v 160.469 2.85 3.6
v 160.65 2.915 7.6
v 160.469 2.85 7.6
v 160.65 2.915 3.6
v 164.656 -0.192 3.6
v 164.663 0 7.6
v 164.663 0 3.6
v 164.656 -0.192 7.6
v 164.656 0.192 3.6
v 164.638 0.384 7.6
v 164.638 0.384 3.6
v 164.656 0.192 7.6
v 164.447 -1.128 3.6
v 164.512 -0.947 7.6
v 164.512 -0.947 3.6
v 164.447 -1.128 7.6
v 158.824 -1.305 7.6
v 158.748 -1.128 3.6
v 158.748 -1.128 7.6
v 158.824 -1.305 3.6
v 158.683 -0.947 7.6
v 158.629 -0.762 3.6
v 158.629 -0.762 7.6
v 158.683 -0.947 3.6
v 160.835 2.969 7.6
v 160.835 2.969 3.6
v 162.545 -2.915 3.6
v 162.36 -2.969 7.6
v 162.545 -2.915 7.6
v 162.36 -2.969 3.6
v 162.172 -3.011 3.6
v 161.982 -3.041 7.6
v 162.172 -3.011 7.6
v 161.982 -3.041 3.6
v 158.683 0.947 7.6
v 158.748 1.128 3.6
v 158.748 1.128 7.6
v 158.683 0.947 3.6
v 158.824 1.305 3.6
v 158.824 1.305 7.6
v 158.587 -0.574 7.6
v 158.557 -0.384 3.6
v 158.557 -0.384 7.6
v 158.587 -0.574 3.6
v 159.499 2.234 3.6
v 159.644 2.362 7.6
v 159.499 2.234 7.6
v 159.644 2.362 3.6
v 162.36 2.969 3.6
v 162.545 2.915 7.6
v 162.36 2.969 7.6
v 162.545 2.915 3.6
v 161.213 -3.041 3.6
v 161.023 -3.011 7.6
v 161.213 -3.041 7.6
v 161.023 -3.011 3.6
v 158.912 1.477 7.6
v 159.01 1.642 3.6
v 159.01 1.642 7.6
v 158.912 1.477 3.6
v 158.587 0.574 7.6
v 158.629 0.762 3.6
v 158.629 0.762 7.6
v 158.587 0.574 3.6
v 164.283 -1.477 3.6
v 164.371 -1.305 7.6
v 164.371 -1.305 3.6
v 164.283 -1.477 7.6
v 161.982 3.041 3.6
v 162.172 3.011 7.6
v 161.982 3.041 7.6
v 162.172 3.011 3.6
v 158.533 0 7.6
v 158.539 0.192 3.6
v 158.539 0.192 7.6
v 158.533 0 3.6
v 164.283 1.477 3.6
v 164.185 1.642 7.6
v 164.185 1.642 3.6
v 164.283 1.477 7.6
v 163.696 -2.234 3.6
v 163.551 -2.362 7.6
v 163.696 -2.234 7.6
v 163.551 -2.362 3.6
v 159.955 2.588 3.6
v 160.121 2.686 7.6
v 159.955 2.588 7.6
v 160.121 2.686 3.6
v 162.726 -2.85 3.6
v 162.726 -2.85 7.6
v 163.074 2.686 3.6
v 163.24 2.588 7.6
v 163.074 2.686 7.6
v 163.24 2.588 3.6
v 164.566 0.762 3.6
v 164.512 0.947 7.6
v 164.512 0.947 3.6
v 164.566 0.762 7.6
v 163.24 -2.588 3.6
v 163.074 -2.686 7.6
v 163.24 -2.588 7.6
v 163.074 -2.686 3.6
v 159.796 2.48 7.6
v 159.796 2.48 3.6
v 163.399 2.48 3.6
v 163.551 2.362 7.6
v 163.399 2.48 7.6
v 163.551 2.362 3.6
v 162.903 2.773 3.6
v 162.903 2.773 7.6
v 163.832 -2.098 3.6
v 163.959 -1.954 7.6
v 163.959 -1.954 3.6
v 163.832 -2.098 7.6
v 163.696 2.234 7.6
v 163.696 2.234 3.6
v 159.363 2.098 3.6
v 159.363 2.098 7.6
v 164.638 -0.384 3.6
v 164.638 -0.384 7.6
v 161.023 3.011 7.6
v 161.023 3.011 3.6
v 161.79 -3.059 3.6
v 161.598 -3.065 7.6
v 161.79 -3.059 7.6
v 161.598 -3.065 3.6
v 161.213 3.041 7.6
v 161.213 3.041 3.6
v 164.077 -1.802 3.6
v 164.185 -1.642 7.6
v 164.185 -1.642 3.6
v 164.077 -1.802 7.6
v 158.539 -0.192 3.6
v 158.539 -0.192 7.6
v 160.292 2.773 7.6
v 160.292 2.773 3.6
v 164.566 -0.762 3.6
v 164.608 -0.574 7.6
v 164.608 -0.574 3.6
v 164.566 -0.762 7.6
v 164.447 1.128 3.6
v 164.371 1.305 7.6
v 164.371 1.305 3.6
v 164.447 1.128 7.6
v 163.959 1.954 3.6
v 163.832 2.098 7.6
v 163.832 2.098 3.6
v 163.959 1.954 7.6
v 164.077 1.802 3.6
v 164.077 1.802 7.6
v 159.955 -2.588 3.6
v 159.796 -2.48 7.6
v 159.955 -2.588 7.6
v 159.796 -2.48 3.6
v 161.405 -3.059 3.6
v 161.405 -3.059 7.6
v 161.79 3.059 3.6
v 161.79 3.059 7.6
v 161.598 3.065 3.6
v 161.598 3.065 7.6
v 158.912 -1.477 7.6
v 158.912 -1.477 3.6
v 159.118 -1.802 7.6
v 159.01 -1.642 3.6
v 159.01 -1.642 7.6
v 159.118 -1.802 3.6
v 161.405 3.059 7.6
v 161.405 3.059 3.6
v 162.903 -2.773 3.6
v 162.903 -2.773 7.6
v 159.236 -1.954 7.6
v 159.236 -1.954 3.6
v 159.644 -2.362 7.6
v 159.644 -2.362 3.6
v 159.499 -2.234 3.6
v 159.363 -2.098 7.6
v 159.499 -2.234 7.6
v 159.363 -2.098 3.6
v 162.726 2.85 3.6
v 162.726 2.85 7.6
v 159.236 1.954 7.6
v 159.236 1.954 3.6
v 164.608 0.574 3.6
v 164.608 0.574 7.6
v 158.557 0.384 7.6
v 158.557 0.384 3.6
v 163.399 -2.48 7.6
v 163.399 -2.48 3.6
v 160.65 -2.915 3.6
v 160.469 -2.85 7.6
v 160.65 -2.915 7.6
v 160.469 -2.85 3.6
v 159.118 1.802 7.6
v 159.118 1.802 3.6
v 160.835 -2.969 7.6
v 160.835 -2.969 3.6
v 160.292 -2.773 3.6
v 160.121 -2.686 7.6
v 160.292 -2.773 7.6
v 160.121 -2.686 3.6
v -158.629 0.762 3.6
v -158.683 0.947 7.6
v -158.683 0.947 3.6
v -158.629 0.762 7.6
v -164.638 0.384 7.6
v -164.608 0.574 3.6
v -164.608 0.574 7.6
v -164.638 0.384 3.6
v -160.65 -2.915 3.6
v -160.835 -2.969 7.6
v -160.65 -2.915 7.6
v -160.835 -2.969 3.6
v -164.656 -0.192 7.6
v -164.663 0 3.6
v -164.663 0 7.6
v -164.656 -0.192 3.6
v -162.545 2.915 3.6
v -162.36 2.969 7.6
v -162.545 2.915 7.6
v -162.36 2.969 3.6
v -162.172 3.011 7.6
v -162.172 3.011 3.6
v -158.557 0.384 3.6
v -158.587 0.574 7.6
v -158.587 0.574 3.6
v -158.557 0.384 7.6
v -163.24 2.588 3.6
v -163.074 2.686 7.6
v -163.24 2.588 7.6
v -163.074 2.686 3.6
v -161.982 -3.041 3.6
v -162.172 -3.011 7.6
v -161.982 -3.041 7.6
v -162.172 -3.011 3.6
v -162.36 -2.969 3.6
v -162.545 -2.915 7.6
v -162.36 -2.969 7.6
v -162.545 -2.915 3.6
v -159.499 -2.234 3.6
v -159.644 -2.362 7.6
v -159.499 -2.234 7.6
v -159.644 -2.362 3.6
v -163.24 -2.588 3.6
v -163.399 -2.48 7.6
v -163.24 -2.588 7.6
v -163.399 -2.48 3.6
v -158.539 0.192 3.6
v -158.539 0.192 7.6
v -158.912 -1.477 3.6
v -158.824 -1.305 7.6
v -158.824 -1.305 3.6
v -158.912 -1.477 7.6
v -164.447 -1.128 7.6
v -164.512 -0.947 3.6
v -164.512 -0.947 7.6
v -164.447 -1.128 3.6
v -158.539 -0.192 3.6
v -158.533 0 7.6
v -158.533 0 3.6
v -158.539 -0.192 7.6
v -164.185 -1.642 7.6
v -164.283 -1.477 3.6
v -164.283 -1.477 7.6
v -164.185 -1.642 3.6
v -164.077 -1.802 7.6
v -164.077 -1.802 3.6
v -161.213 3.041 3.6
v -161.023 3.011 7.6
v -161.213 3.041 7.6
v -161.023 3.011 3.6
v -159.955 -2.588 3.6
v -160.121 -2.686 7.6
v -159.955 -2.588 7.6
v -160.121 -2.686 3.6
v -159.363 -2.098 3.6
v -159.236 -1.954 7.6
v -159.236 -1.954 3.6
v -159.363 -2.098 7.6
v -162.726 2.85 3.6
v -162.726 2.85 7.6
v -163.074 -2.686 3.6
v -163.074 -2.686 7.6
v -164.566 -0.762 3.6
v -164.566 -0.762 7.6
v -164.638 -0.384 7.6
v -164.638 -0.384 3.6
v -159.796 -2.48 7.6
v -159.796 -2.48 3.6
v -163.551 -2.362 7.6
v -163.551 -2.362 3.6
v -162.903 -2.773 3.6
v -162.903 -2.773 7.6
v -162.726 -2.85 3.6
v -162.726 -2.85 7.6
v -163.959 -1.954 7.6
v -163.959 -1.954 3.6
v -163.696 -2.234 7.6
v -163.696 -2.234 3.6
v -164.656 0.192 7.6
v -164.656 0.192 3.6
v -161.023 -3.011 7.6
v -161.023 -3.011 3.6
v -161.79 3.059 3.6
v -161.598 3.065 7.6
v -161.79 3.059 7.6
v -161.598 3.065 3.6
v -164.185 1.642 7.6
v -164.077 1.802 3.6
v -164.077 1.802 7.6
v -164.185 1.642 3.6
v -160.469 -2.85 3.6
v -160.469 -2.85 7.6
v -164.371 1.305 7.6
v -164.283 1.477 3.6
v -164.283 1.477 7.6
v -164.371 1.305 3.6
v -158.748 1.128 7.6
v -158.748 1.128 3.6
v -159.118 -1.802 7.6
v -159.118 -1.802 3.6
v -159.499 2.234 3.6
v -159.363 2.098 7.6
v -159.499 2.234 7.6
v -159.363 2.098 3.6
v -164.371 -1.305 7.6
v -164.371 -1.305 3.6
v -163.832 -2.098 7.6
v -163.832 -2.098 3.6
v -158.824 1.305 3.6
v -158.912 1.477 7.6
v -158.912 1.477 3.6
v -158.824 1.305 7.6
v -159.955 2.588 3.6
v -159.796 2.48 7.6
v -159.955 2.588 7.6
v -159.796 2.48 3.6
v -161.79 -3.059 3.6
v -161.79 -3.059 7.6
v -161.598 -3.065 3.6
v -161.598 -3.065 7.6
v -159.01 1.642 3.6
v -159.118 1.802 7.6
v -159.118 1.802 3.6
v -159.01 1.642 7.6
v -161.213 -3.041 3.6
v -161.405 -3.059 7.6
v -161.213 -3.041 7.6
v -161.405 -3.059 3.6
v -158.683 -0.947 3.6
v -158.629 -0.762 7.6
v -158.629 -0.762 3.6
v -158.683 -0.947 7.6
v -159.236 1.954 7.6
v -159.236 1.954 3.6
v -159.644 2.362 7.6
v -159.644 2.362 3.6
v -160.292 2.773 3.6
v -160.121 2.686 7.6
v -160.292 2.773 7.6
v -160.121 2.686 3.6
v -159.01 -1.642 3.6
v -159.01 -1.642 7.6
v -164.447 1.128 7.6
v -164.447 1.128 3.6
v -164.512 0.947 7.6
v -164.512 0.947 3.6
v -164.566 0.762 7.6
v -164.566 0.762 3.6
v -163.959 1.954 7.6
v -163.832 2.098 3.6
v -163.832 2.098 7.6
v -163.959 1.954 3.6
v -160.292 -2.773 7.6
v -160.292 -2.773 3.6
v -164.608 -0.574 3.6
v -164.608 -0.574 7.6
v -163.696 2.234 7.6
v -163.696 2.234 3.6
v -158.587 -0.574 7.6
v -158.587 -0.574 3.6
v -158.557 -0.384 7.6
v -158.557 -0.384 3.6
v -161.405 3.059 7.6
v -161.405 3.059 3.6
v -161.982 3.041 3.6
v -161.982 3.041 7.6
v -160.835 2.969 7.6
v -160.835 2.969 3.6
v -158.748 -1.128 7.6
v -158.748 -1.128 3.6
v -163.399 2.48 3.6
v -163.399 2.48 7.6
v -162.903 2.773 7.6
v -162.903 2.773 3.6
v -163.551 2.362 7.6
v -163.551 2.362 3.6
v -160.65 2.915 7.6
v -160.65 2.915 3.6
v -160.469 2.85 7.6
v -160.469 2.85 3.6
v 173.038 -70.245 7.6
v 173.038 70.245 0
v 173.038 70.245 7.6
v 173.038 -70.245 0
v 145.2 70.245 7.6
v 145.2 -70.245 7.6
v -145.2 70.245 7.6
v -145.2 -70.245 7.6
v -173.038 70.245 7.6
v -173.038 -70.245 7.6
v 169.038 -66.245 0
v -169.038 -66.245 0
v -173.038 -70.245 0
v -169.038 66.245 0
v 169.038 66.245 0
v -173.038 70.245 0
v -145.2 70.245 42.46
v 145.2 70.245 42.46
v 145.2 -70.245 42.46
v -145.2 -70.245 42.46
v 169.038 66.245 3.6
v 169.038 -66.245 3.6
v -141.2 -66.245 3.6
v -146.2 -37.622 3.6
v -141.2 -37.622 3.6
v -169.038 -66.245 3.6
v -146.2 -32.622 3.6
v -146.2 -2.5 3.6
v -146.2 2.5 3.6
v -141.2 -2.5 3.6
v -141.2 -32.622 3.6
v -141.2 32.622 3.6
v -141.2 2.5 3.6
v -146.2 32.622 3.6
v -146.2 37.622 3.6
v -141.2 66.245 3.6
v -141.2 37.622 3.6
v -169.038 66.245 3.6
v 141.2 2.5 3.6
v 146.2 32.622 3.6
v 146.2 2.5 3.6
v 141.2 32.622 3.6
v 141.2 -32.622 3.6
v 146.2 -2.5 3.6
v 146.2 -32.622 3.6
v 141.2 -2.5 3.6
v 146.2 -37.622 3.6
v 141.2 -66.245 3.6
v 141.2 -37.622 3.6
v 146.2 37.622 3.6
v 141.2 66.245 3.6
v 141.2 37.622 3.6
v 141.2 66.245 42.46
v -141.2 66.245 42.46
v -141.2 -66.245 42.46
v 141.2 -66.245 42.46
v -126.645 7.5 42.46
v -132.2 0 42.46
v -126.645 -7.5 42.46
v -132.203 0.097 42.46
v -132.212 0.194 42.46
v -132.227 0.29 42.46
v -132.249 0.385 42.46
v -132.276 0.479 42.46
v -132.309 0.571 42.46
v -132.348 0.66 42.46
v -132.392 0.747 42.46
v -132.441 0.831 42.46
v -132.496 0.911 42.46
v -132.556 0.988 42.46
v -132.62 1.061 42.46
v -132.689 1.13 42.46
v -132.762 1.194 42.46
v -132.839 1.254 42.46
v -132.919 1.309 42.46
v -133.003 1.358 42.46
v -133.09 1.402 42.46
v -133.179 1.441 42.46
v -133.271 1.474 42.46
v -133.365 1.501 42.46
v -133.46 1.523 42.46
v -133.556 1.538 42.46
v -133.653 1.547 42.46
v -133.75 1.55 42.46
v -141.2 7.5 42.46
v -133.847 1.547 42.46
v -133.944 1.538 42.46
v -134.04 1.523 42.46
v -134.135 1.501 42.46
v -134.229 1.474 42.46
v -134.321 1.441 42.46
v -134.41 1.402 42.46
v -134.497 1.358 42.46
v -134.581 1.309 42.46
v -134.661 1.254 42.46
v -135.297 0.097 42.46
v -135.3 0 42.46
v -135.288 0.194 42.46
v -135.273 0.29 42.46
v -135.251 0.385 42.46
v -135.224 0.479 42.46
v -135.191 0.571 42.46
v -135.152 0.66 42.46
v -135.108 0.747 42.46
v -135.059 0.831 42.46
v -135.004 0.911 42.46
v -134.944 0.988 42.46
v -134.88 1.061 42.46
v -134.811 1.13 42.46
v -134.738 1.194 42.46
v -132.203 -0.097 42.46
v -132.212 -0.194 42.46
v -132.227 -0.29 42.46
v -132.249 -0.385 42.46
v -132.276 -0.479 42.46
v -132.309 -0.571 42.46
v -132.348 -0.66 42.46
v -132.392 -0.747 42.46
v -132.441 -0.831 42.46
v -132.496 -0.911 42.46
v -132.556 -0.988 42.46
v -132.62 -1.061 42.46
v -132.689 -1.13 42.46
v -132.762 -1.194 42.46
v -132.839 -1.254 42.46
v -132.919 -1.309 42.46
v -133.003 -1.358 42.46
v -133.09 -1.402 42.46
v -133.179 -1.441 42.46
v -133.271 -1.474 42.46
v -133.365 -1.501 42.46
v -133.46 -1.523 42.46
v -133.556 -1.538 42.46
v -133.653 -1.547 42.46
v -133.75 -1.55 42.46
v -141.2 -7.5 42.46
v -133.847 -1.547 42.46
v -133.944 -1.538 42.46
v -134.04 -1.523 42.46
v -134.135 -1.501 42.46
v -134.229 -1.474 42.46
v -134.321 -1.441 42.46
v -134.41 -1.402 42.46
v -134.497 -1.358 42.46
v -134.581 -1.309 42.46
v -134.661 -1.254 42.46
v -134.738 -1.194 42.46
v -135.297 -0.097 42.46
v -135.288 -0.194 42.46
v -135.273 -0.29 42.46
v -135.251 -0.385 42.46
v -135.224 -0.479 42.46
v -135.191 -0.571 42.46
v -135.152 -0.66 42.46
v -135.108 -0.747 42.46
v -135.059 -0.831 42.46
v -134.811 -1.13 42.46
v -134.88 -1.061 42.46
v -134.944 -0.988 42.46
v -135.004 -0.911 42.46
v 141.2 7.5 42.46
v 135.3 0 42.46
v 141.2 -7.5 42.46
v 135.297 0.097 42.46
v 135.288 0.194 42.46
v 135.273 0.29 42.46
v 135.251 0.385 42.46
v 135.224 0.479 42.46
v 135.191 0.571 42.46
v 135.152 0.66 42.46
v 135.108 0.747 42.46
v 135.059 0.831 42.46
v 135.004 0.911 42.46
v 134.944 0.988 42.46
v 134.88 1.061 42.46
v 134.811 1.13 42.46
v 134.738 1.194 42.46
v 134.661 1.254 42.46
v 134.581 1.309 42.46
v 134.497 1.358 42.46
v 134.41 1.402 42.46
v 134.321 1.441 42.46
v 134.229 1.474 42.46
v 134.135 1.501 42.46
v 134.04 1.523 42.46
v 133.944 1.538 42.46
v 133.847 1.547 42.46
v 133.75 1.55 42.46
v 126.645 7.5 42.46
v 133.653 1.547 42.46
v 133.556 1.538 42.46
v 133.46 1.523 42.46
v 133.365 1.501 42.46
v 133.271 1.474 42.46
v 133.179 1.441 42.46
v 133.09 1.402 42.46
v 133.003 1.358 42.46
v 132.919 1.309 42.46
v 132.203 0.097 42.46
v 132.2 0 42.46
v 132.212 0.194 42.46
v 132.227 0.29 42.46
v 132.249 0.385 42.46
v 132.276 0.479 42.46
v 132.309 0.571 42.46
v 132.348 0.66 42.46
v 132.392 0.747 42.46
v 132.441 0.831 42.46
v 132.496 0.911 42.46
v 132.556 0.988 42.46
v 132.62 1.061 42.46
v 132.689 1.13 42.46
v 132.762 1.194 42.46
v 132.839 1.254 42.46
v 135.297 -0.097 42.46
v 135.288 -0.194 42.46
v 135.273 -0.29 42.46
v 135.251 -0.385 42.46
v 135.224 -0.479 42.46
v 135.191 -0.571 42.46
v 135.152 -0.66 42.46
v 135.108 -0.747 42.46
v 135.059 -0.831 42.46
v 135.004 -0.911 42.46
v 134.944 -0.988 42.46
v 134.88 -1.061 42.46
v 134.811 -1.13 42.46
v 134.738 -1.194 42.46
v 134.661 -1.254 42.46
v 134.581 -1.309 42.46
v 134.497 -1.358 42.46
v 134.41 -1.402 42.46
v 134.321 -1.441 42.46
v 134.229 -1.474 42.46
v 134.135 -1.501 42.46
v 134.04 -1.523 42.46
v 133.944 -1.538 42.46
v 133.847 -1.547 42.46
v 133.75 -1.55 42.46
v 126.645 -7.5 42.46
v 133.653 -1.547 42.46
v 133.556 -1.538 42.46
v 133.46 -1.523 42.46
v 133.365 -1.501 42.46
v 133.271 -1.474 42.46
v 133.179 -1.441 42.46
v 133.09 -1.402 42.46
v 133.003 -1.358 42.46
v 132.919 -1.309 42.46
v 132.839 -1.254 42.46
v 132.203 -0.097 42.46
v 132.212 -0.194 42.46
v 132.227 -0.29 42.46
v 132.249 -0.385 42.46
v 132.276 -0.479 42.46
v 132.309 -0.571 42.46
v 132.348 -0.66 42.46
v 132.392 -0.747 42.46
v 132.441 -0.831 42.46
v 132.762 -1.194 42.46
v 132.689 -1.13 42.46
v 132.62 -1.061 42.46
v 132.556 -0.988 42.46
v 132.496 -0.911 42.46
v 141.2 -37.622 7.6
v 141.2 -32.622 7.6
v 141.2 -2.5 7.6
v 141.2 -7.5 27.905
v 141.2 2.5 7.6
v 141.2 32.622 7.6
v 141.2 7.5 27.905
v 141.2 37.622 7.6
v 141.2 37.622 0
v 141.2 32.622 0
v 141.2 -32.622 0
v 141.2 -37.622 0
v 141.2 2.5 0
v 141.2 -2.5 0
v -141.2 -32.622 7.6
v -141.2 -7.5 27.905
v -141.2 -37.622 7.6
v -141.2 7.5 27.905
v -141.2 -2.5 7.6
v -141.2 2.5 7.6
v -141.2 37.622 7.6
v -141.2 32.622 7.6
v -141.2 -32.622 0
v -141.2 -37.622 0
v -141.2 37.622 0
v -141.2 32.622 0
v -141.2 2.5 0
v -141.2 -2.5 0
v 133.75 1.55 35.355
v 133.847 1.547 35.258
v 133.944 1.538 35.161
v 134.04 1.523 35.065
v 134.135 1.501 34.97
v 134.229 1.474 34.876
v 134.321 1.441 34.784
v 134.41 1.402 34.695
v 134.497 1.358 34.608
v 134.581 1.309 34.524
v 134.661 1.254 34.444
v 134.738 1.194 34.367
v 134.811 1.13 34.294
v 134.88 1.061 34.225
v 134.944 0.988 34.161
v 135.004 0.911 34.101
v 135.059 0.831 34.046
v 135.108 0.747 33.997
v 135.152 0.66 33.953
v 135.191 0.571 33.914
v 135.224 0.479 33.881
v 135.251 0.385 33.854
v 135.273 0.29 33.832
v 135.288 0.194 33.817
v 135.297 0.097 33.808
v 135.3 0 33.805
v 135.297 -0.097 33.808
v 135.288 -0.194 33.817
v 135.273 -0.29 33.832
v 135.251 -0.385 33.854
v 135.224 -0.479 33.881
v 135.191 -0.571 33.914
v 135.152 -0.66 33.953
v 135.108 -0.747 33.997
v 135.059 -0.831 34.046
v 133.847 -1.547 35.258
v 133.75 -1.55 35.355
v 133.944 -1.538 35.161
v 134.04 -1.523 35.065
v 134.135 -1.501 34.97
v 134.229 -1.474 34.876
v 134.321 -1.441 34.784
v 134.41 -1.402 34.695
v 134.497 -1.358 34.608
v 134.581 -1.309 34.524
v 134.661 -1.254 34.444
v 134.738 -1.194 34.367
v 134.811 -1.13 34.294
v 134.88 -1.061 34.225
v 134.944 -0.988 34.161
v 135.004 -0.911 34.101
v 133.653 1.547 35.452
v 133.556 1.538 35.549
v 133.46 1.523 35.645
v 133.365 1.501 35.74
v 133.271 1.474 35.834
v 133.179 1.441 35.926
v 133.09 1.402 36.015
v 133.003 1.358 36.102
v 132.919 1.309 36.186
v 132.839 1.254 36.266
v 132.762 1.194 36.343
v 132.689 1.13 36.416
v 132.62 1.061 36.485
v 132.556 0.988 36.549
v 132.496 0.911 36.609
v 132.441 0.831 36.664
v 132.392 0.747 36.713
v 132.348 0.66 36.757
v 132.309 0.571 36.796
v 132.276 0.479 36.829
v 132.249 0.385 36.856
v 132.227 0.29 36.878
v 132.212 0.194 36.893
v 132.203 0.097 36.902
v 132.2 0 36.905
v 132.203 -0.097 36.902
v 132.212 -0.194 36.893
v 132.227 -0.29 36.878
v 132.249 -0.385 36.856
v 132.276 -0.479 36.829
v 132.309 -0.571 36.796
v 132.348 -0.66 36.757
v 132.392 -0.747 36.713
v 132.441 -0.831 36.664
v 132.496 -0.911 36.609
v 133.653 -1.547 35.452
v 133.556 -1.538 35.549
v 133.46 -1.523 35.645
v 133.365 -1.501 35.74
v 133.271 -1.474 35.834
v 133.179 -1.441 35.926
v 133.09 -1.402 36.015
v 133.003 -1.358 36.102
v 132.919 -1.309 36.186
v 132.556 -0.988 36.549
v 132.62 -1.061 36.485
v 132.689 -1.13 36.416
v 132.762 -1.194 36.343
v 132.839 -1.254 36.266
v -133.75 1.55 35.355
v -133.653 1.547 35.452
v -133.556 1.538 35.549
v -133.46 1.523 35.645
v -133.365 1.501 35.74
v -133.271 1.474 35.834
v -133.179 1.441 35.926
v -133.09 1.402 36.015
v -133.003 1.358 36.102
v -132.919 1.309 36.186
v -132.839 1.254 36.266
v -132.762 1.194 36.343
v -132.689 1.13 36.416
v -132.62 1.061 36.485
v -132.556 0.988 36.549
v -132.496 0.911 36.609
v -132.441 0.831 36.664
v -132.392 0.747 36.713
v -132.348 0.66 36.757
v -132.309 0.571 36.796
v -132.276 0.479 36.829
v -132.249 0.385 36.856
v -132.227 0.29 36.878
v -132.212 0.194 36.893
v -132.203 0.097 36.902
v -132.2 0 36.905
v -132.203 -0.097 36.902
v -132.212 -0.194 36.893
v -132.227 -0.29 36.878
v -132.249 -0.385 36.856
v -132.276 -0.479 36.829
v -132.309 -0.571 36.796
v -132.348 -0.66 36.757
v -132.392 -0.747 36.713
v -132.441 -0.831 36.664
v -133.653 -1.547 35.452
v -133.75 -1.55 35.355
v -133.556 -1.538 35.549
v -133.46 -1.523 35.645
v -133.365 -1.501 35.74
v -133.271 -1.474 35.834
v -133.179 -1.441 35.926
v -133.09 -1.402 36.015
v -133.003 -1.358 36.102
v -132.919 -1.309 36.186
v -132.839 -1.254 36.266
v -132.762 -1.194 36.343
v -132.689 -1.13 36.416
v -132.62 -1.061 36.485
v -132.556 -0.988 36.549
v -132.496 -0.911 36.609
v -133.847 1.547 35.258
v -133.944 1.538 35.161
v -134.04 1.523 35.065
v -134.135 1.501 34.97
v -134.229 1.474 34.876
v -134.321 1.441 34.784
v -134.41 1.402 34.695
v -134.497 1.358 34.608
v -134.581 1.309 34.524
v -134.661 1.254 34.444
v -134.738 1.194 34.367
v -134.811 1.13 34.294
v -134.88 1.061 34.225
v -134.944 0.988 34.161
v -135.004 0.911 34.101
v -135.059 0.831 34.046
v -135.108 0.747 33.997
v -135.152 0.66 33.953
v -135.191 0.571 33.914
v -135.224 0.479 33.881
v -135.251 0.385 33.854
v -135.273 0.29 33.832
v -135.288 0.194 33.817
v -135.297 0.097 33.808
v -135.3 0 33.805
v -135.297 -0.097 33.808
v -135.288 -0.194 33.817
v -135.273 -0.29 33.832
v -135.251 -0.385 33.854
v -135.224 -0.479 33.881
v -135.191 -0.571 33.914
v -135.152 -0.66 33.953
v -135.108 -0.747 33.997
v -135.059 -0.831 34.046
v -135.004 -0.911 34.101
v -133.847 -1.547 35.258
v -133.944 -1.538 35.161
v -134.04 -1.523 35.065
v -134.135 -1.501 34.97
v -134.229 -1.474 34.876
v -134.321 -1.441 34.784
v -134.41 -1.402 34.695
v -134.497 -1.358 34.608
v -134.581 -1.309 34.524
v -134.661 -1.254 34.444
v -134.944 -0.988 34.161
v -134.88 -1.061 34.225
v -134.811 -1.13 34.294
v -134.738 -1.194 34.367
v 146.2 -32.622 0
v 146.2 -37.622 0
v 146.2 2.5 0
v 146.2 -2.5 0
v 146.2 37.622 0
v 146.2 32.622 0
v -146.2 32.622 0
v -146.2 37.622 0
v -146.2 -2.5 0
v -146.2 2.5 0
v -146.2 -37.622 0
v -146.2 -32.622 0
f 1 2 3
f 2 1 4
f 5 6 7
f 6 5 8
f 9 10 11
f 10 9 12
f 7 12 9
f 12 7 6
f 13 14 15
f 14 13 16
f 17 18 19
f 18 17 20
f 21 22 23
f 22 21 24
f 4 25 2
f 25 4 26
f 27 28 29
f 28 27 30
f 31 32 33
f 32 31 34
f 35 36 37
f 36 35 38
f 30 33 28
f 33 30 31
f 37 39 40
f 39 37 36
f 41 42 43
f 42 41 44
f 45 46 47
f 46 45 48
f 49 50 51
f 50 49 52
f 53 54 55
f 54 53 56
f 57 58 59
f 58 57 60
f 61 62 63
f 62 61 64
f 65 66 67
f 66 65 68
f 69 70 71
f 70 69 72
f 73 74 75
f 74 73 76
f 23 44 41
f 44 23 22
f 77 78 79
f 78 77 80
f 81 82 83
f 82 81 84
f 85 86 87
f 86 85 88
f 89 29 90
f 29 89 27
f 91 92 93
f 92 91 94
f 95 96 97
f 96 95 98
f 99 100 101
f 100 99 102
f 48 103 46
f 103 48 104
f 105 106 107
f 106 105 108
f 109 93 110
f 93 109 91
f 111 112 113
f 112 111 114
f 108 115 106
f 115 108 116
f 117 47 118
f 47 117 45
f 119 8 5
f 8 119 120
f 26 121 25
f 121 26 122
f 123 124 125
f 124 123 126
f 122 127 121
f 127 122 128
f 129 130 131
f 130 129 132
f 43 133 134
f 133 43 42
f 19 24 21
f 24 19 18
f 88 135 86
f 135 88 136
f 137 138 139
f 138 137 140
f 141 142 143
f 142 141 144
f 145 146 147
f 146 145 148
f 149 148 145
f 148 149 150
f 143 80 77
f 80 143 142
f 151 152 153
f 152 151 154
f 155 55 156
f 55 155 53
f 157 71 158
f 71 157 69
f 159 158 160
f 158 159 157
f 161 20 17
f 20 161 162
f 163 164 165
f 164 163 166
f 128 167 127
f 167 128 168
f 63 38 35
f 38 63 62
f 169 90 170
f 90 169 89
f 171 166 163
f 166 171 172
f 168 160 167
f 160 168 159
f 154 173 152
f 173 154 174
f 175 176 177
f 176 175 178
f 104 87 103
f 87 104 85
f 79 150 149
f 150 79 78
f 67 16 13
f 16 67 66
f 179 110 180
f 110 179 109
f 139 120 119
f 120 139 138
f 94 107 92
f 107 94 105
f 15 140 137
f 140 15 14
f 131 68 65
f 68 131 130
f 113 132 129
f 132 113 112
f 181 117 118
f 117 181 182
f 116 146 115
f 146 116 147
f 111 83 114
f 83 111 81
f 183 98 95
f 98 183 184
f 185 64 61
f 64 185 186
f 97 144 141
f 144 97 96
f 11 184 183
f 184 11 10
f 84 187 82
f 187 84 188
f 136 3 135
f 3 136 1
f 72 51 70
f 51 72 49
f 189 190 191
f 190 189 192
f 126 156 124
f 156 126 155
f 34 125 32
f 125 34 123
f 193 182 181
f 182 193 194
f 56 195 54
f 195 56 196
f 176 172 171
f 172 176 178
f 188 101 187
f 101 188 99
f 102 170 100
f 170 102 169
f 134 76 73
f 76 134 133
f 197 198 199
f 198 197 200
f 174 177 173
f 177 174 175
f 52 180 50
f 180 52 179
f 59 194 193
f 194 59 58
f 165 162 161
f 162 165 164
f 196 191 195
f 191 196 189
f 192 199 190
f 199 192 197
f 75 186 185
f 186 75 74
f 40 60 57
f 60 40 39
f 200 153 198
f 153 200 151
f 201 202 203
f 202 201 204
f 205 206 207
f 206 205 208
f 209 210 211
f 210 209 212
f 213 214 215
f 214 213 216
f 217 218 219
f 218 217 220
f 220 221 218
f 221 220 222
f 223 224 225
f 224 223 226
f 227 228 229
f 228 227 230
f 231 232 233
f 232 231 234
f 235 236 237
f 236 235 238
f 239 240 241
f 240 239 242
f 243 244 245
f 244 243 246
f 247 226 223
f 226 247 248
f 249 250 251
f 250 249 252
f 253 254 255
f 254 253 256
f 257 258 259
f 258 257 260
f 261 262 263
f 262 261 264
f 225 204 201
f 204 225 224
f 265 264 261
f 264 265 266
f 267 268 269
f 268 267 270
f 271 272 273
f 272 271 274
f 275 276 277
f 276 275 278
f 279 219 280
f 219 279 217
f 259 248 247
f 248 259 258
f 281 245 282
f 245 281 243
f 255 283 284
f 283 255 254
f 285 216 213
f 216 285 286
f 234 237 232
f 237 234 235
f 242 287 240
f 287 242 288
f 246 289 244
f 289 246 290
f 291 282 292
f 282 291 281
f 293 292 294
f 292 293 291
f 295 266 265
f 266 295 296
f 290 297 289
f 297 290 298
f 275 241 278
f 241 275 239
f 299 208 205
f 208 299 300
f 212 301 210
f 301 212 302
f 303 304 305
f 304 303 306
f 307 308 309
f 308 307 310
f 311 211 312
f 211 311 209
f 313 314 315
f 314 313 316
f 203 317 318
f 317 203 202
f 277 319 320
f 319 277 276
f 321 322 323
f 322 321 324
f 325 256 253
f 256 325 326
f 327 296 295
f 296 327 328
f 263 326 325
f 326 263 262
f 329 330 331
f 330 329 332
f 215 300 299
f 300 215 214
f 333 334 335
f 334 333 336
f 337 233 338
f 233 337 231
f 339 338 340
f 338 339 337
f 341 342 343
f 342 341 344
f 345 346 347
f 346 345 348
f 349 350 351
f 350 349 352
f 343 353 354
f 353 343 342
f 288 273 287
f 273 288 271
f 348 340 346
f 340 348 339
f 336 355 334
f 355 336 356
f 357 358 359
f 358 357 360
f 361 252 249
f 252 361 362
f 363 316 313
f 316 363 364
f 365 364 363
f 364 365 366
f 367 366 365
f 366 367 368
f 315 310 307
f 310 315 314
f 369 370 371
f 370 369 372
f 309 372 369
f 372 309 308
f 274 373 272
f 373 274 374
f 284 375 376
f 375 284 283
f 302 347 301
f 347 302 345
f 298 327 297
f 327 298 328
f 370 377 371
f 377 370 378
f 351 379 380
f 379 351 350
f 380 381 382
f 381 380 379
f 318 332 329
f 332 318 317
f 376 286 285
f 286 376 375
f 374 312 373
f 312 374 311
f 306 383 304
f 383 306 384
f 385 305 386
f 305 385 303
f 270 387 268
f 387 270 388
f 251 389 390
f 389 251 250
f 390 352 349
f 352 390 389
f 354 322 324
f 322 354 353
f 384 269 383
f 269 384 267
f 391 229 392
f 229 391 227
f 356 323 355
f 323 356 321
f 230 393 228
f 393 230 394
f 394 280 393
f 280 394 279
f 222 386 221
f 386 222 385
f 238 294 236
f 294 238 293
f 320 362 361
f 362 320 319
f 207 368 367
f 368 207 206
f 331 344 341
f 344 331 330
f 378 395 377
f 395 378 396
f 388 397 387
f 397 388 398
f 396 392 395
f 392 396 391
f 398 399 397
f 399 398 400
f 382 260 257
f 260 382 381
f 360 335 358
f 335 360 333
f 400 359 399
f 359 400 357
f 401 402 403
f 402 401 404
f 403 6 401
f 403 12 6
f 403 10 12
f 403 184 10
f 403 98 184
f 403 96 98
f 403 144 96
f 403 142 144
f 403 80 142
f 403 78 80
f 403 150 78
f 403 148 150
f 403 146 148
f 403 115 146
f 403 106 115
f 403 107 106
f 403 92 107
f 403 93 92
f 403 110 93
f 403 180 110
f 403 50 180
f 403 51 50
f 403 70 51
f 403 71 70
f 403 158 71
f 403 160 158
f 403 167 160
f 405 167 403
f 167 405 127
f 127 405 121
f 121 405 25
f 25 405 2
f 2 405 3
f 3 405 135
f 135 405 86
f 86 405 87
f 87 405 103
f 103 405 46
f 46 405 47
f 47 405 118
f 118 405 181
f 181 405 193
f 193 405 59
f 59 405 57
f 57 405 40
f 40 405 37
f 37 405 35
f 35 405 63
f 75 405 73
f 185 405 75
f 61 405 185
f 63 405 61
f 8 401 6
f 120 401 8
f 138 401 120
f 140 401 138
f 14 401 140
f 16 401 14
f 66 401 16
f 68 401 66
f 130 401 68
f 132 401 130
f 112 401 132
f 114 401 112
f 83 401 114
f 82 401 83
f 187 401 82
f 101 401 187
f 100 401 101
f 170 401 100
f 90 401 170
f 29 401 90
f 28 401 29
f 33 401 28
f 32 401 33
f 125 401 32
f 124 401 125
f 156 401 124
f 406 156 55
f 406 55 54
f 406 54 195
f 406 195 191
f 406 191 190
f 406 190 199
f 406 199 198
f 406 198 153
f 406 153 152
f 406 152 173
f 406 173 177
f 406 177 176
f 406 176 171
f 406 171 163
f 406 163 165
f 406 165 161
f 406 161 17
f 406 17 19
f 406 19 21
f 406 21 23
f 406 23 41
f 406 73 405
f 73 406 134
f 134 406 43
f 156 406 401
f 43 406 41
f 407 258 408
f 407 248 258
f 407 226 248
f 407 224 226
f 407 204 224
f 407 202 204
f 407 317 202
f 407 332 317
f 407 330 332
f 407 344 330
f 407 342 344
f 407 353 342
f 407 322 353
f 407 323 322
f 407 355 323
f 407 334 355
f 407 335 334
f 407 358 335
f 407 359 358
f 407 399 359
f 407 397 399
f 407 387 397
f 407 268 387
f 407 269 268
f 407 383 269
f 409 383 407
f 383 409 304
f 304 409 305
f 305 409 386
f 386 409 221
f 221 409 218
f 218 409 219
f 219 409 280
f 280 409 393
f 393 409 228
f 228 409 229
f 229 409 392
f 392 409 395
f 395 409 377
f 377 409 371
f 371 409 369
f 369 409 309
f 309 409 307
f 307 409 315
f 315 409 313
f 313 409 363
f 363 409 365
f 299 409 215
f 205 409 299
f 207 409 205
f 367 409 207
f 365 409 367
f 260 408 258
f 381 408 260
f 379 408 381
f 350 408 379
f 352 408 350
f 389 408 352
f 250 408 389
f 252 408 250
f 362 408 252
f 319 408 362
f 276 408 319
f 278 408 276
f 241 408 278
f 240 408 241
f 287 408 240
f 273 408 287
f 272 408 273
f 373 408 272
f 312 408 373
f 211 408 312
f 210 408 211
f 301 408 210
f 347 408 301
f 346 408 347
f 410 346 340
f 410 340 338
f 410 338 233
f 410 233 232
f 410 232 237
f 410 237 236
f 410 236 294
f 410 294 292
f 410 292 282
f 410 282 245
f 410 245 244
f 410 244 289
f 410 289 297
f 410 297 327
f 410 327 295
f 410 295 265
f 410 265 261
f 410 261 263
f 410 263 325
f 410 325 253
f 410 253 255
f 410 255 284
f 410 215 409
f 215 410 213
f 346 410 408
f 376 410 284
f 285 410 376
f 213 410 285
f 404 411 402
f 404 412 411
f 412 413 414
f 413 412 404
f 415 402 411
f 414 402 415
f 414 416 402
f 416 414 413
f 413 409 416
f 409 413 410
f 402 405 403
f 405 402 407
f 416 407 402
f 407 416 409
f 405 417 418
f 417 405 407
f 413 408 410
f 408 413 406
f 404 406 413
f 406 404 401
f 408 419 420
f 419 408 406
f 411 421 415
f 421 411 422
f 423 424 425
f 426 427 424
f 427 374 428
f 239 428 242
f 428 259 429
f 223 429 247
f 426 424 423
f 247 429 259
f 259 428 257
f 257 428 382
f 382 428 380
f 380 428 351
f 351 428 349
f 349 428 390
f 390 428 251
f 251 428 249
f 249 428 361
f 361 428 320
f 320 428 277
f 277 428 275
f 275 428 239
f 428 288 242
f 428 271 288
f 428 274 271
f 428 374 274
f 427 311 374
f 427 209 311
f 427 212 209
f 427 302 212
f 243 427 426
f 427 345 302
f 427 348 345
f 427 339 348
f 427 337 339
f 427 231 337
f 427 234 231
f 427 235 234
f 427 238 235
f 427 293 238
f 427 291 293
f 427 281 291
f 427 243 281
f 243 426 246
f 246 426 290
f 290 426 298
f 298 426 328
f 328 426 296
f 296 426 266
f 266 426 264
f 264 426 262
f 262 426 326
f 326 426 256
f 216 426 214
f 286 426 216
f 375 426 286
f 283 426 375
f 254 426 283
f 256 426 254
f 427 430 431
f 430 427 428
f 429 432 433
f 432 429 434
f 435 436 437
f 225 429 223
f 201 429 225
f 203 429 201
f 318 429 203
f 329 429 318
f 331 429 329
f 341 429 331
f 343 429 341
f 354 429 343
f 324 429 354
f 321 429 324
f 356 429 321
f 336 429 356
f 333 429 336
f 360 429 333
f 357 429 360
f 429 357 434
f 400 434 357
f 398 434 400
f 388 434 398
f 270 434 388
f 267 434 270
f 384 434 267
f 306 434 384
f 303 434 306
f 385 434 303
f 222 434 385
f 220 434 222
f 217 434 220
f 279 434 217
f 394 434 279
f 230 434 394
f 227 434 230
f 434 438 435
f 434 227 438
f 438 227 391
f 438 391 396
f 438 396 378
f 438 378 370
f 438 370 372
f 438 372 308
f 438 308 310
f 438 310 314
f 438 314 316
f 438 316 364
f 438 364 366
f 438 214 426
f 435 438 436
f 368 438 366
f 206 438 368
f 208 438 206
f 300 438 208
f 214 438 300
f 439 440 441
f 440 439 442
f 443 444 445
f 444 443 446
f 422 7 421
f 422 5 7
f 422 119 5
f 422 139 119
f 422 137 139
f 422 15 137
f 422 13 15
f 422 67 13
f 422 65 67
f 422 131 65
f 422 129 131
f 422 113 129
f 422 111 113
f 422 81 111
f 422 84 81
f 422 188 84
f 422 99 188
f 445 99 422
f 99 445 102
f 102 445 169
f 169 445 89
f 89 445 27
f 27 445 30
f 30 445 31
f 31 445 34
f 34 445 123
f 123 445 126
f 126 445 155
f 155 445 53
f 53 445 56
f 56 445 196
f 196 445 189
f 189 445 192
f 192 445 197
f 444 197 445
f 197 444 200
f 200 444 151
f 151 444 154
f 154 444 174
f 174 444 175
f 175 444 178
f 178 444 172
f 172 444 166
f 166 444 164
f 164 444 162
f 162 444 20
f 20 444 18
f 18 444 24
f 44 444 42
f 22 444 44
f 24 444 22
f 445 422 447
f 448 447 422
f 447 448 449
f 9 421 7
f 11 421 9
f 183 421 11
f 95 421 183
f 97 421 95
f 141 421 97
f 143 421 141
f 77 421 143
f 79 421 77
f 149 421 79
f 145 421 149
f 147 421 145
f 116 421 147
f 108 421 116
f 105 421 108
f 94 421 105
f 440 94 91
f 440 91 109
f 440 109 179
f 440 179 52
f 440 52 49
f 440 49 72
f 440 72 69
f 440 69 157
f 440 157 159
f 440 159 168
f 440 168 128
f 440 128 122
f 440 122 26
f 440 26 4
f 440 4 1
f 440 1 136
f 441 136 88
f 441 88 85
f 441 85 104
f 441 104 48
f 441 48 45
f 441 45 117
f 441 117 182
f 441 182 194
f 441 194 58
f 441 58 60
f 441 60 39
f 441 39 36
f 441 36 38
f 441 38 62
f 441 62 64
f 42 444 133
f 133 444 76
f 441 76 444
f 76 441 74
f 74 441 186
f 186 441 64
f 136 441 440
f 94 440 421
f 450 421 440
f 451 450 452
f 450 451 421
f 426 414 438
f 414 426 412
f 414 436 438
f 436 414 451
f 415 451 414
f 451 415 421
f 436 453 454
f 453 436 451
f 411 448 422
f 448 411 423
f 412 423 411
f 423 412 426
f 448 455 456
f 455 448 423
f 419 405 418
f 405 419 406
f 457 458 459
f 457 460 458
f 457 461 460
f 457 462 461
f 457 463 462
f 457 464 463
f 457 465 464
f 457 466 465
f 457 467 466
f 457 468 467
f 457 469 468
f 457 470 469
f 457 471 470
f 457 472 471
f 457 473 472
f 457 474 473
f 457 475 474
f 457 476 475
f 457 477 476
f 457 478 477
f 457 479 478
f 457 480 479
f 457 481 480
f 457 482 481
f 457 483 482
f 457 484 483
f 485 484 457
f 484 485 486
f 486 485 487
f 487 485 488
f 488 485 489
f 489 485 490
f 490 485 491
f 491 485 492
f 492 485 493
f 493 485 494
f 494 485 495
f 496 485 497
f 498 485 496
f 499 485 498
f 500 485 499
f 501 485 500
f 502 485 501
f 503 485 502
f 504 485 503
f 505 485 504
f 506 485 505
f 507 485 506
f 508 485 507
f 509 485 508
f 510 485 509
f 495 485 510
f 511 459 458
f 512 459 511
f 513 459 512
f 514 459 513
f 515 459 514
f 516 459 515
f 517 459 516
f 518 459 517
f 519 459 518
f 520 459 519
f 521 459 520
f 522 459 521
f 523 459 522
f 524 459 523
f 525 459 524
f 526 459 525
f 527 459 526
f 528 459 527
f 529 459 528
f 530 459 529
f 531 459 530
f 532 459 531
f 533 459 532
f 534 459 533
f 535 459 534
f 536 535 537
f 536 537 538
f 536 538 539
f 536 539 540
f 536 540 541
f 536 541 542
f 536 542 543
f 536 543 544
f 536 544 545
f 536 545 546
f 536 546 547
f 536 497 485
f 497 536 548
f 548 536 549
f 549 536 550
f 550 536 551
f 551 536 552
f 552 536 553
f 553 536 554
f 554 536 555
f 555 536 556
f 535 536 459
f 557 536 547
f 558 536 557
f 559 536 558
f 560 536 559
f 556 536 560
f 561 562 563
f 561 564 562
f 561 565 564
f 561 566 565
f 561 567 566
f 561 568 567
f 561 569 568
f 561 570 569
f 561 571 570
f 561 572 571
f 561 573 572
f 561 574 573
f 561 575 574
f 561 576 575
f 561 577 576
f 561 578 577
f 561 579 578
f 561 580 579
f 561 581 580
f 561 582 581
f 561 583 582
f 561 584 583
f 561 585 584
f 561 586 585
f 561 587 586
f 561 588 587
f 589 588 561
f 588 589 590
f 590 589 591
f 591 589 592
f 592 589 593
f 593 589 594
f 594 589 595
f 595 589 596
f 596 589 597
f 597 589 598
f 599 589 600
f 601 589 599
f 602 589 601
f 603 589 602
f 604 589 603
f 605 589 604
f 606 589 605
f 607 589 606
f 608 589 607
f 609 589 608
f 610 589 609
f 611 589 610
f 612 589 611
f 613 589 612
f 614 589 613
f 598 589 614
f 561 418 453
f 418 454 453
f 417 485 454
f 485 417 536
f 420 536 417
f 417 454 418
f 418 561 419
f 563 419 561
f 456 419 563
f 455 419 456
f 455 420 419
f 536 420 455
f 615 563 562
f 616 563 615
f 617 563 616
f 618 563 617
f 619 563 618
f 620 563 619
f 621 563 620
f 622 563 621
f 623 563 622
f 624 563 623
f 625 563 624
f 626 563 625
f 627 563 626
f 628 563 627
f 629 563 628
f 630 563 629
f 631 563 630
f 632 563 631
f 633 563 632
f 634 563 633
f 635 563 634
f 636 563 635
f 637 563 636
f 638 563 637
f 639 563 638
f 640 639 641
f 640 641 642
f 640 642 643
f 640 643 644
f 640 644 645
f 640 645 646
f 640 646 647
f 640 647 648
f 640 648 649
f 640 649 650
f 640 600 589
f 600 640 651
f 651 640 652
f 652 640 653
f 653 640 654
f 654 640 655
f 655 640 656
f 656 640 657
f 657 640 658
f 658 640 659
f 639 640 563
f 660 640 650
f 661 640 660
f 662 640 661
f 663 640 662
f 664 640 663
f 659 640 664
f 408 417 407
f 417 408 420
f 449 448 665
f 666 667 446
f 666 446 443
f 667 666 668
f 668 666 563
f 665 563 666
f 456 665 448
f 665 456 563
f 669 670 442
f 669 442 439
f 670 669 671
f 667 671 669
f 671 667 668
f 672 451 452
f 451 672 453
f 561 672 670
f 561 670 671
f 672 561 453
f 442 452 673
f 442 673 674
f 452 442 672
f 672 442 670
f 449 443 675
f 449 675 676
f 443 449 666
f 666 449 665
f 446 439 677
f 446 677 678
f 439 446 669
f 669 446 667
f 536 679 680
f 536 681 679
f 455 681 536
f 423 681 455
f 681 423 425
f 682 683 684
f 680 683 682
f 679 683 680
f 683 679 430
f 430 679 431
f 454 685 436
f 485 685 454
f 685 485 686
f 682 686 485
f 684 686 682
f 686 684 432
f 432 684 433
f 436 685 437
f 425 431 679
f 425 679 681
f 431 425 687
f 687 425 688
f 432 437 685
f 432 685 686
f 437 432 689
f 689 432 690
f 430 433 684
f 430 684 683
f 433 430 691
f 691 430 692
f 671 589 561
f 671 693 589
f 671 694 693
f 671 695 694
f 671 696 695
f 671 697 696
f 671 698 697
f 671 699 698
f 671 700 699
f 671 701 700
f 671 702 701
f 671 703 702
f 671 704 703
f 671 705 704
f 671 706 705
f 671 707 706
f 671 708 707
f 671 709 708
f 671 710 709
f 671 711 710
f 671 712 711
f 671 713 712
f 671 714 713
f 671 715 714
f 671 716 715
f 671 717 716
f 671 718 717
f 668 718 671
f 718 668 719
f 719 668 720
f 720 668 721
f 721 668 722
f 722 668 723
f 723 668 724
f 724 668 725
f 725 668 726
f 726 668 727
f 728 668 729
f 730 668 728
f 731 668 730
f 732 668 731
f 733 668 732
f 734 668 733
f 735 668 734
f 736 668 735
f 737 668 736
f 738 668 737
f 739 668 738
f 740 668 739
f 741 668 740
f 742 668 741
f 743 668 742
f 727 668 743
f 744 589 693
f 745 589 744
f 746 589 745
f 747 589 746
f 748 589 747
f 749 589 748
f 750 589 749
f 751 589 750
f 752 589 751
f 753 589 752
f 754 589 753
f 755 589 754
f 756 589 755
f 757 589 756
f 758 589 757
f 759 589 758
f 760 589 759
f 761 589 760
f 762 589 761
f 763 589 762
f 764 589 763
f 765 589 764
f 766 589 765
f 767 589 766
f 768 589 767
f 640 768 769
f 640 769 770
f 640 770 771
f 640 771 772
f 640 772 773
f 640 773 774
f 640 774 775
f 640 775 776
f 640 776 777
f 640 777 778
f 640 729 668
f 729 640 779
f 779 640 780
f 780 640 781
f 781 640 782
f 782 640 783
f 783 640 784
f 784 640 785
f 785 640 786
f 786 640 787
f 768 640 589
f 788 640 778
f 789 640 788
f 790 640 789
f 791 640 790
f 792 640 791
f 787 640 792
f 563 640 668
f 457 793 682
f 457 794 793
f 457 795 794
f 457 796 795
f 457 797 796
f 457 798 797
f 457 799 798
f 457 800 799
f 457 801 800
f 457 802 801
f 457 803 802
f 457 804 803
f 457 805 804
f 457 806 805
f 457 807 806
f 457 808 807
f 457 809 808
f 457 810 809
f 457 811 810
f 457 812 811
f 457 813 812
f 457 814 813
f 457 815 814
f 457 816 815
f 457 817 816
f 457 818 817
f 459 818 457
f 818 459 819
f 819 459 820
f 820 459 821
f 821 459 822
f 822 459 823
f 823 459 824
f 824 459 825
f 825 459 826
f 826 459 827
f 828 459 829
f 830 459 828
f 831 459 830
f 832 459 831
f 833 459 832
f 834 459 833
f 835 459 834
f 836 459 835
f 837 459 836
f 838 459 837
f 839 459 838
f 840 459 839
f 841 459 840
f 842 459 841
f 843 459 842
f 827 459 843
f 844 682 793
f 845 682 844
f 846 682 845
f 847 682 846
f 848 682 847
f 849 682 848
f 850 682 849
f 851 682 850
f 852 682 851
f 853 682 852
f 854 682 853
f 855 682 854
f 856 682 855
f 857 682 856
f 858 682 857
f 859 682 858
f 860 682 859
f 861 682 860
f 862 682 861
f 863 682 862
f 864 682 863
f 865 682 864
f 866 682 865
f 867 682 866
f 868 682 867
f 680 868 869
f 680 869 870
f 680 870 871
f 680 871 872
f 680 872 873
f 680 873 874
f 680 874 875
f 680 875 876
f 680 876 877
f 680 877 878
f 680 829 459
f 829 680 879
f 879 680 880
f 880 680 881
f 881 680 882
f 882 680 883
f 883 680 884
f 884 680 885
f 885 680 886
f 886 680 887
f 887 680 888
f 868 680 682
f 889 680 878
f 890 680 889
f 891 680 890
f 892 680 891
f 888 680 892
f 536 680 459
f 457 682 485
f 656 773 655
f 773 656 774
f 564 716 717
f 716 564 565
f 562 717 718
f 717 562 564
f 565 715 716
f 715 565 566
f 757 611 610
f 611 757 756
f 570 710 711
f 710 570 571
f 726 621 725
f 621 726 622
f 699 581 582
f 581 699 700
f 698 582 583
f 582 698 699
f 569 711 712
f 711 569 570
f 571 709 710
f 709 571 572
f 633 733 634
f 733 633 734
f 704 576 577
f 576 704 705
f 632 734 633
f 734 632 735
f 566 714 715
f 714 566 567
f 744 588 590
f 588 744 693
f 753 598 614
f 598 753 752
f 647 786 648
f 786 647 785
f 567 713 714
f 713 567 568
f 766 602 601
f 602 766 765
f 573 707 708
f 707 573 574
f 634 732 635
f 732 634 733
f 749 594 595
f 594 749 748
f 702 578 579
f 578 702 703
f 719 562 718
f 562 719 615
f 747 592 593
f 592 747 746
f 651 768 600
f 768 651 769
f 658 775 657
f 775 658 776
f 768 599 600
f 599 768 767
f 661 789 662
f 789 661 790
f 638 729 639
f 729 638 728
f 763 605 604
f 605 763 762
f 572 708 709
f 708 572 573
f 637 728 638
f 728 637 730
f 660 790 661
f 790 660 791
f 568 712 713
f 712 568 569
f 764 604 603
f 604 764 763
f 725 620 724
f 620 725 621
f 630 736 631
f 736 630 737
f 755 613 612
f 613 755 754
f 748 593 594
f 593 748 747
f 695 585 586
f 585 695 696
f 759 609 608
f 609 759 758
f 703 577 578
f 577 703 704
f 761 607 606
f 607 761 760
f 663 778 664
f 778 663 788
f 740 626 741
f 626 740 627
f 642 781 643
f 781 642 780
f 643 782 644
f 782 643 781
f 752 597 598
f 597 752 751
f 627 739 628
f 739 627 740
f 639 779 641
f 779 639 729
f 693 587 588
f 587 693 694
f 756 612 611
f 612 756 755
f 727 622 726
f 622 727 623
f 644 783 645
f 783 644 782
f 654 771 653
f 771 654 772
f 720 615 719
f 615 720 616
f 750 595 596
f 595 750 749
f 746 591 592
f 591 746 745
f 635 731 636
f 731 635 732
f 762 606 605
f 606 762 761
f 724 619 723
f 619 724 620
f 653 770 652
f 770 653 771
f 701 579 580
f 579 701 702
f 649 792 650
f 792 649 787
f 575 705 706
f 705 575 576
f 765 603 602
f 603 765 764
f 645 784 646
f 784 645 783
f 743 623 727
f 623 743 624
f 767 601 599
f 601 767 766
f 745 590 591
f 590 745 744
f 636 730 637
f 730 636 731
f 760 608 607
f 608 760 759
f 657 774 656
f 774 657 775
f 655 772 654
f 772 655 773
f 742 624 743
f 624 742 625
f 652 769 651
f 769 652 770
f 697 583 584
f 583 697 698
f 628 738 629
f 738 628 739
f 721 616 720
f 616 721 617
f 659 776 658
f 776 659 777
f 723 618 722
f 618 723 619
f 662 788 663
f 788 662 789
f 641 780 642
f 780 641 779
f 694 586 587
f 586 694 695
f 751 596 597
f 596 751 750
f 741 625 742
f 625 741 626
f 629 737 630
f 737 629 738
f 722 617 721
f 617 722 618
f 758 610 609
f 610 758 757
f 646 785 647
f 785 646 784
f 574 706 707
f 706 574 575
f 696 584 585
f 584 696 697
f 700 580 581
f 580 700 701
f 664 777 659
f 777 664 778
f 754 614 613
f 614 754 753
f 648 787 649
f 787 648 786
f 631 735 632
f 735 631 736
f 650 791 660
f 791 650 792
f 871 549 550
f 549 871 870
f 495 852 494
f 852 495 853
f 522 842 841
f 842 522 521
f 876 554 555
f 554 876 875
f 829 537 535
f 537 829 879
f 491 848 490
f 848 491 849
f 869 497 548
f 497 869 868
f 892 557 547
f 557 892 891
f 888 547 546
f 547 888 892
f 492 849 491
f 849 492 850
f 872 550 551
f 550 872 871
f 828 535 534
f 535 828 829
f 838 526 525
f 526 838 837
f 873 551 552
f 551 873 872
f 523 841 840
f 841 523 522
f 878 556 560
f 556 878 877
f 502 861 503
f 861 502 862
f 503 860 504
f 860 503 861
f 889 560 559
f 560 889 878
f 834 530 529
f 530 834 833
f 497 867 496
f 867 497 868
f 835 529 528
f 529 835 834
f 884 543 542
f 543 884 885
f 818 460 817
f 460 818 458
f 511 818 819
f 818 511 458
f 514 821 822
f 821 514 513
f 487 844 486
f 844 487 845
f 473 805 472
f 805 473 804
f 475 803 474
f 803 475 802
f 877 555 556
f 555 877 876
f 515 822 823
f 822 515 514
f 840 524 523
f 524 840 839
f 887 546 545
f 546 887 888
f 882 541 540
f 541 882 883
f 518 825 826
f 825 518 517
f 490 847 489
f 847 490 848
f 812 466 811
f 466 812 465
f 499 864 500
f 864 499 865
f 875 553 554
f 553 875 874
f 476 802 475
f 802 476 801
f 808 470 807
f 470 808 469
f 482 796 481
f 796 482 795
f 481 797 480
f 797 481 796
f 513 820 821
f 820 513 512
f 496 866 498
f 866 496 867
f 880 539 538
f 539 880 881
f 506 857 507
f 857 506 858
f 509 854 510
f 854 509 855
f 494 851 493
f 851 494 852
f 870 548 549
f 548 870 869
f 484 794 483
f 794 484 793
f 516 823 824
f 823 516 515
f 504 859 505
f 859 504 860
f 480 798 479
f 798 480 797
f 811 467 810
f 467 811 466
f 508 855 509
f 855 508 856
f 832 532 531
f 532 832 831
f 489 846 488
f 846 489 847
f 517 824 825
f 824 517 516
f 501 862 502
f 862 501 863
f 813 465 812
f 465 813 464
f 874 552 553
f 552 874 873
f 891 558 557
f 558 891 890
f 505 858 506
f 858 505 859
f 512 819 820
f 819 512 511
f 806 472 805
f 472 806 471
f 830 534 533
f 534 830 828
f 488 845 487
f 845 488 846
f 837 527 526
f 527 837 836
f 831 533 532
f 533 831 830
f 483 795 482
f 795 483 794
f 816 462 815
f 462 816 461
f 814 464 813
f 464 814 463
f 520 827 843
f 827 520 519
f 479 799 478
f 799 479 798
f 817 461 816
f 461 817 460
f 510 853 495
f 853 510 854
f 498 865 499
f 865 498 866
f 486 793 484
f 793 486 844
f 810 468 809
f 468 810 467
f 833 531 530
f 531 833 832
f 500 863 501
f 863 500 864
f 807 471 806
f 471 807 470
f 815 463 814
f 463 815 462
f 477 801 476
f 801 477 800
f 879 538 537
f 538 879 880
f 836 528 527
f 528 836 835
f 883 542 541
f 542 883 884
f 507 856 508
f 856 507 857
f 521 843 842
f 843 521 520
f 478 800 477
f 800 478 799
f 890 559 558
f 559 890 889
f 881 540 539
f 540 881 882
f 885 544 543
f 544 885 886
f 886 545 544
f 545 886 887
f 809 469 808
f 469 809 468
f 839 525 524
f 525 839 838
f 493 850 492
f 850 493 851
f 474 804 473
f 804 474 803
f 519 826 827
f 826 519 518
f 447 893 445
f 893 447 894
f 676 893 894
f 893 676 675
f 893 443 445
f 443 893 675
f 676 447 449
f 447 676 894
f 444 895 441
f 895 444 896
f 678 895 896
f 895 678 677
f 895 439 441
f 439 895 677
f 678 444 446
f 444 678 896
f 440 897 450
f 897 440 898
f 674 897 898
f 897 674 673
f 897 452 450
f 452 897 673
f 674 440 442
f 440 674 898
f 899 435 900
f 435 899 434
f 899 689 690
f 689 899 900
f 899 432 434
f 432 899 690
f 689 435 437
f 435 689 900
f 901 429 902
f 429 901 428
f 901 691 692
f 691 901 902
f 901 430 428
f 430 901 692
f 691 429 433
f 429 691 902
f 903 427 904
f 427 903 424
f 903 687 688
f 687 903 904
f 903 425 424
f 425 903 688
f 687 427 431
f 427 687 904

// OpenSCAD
// fan

box_depth = 42.46;
box_width = 99.33;
box_length = 139.92 + 106.26;
bevel = 20.58; // short way
bevel_length = 22.11; // long way
top_depth = 6.40;
hole_from_edge = 11.45;
hole_diameter = 3.1; //4.13;

// plate

width = 134;
depth = 7.6;
length = (13+5/8) * 25.4;
plate_hole_from_edge = 11.44;
plate_hole_diameter = 6.13;

plate_thickness = 4;

$fn = 100;

part_width = max(box_width + bevel*2, width);

   module prism(l, w, h){
     translate([-l/2, -w/2, -h/2])
       polyhedron(
               points=[[0,0,0], [l,0,0], [l,w,0], [0,w,0], [0,w,h], [l,w,h]],
               faces=[[0,1,2,3],[5,4,3,2],[0,4,5,1],[0,3,4],[5,2,1]]
               );
              }

module fan_body() {
  translate([0, 0, box_depth/2])
  cube([box_length, box_width, box_depth],center=true);

  translate([0, 0, box_depth + top_depth / 2])
  cube([
    bevel_length*2+box_length, 
    bevel*2+box_width, 
    top_depth
  ], center=true);
}

module fan_holes() {
  for (rot = [0, 180]) {
    rotate([0, 0, rot])
    translate([box_length/2 + bevel_length - hole_from_edge, 0, box_depth+top_depth/2])
    cylinder(h=top_depth*2, d=hole_diameter, center=true);
  }
}



module fan () {
  difference() {
    fan_body();
    fan_holes();
  }
}

//fan();

module plate(width = width) {
  difference () {
    translate([0, 0, depth/2])
      cube([length, width, depth], center=true);
      
    translate([0, 0, depth/2-plate_thickness])
      cube([length-plate_thickness*2, width-plate_thickness*2, depth], center=true);
      
    for (rot = [0, 180]) {
      rotate([0, 0, rot])
        translate([length/2 - plate_hole_from_edge, 0, depth/2])
          cylinder(h=depth*2, d=plate_hole_diameter, center=true);
    }
  }
}

module part_body() {
plate(width=part_width);

translate([0, 0, (box_depth+depth)/2])
cube([
    bevel_length*2+box_length, 
    bevel*2+box_width, 
    box_depth-depth
  ], center=true);
}

//#fan();

difference () {
  part_body();
  
  translate([0, 0, (box_depth+depth)/2])
  cube([
    bevel_length*2+box_length-plate_thickness*2, 
    bevel*2+box_width-plate_thickness*2, 
    box_depth-depth+10
  ], center=true);
}

mount_size = 15;


difference () {
for (rot = [0, 180]) {
  rotate([0, 0, rot])
  translate([box_length/2+bevel_length/2, 0, box_depth-mount_size/2])
  rotate([180, 0, 90])
  prism(mount_size, mount_size, mount_size);
}

translate([0, 0, -top_depth])
fan_holes();
}

support_size = 5;

for (rot = [0, 180]) {
  
  rotate([0, 0, rot])
for (y = [-part_width/4, 0, part_width/4]) {
  
translate([bevel_length+box_length/2-plate_thickness+support_size/2, y, depth/2])
cube([support_size, support_size, depth], center=true);
}
}
